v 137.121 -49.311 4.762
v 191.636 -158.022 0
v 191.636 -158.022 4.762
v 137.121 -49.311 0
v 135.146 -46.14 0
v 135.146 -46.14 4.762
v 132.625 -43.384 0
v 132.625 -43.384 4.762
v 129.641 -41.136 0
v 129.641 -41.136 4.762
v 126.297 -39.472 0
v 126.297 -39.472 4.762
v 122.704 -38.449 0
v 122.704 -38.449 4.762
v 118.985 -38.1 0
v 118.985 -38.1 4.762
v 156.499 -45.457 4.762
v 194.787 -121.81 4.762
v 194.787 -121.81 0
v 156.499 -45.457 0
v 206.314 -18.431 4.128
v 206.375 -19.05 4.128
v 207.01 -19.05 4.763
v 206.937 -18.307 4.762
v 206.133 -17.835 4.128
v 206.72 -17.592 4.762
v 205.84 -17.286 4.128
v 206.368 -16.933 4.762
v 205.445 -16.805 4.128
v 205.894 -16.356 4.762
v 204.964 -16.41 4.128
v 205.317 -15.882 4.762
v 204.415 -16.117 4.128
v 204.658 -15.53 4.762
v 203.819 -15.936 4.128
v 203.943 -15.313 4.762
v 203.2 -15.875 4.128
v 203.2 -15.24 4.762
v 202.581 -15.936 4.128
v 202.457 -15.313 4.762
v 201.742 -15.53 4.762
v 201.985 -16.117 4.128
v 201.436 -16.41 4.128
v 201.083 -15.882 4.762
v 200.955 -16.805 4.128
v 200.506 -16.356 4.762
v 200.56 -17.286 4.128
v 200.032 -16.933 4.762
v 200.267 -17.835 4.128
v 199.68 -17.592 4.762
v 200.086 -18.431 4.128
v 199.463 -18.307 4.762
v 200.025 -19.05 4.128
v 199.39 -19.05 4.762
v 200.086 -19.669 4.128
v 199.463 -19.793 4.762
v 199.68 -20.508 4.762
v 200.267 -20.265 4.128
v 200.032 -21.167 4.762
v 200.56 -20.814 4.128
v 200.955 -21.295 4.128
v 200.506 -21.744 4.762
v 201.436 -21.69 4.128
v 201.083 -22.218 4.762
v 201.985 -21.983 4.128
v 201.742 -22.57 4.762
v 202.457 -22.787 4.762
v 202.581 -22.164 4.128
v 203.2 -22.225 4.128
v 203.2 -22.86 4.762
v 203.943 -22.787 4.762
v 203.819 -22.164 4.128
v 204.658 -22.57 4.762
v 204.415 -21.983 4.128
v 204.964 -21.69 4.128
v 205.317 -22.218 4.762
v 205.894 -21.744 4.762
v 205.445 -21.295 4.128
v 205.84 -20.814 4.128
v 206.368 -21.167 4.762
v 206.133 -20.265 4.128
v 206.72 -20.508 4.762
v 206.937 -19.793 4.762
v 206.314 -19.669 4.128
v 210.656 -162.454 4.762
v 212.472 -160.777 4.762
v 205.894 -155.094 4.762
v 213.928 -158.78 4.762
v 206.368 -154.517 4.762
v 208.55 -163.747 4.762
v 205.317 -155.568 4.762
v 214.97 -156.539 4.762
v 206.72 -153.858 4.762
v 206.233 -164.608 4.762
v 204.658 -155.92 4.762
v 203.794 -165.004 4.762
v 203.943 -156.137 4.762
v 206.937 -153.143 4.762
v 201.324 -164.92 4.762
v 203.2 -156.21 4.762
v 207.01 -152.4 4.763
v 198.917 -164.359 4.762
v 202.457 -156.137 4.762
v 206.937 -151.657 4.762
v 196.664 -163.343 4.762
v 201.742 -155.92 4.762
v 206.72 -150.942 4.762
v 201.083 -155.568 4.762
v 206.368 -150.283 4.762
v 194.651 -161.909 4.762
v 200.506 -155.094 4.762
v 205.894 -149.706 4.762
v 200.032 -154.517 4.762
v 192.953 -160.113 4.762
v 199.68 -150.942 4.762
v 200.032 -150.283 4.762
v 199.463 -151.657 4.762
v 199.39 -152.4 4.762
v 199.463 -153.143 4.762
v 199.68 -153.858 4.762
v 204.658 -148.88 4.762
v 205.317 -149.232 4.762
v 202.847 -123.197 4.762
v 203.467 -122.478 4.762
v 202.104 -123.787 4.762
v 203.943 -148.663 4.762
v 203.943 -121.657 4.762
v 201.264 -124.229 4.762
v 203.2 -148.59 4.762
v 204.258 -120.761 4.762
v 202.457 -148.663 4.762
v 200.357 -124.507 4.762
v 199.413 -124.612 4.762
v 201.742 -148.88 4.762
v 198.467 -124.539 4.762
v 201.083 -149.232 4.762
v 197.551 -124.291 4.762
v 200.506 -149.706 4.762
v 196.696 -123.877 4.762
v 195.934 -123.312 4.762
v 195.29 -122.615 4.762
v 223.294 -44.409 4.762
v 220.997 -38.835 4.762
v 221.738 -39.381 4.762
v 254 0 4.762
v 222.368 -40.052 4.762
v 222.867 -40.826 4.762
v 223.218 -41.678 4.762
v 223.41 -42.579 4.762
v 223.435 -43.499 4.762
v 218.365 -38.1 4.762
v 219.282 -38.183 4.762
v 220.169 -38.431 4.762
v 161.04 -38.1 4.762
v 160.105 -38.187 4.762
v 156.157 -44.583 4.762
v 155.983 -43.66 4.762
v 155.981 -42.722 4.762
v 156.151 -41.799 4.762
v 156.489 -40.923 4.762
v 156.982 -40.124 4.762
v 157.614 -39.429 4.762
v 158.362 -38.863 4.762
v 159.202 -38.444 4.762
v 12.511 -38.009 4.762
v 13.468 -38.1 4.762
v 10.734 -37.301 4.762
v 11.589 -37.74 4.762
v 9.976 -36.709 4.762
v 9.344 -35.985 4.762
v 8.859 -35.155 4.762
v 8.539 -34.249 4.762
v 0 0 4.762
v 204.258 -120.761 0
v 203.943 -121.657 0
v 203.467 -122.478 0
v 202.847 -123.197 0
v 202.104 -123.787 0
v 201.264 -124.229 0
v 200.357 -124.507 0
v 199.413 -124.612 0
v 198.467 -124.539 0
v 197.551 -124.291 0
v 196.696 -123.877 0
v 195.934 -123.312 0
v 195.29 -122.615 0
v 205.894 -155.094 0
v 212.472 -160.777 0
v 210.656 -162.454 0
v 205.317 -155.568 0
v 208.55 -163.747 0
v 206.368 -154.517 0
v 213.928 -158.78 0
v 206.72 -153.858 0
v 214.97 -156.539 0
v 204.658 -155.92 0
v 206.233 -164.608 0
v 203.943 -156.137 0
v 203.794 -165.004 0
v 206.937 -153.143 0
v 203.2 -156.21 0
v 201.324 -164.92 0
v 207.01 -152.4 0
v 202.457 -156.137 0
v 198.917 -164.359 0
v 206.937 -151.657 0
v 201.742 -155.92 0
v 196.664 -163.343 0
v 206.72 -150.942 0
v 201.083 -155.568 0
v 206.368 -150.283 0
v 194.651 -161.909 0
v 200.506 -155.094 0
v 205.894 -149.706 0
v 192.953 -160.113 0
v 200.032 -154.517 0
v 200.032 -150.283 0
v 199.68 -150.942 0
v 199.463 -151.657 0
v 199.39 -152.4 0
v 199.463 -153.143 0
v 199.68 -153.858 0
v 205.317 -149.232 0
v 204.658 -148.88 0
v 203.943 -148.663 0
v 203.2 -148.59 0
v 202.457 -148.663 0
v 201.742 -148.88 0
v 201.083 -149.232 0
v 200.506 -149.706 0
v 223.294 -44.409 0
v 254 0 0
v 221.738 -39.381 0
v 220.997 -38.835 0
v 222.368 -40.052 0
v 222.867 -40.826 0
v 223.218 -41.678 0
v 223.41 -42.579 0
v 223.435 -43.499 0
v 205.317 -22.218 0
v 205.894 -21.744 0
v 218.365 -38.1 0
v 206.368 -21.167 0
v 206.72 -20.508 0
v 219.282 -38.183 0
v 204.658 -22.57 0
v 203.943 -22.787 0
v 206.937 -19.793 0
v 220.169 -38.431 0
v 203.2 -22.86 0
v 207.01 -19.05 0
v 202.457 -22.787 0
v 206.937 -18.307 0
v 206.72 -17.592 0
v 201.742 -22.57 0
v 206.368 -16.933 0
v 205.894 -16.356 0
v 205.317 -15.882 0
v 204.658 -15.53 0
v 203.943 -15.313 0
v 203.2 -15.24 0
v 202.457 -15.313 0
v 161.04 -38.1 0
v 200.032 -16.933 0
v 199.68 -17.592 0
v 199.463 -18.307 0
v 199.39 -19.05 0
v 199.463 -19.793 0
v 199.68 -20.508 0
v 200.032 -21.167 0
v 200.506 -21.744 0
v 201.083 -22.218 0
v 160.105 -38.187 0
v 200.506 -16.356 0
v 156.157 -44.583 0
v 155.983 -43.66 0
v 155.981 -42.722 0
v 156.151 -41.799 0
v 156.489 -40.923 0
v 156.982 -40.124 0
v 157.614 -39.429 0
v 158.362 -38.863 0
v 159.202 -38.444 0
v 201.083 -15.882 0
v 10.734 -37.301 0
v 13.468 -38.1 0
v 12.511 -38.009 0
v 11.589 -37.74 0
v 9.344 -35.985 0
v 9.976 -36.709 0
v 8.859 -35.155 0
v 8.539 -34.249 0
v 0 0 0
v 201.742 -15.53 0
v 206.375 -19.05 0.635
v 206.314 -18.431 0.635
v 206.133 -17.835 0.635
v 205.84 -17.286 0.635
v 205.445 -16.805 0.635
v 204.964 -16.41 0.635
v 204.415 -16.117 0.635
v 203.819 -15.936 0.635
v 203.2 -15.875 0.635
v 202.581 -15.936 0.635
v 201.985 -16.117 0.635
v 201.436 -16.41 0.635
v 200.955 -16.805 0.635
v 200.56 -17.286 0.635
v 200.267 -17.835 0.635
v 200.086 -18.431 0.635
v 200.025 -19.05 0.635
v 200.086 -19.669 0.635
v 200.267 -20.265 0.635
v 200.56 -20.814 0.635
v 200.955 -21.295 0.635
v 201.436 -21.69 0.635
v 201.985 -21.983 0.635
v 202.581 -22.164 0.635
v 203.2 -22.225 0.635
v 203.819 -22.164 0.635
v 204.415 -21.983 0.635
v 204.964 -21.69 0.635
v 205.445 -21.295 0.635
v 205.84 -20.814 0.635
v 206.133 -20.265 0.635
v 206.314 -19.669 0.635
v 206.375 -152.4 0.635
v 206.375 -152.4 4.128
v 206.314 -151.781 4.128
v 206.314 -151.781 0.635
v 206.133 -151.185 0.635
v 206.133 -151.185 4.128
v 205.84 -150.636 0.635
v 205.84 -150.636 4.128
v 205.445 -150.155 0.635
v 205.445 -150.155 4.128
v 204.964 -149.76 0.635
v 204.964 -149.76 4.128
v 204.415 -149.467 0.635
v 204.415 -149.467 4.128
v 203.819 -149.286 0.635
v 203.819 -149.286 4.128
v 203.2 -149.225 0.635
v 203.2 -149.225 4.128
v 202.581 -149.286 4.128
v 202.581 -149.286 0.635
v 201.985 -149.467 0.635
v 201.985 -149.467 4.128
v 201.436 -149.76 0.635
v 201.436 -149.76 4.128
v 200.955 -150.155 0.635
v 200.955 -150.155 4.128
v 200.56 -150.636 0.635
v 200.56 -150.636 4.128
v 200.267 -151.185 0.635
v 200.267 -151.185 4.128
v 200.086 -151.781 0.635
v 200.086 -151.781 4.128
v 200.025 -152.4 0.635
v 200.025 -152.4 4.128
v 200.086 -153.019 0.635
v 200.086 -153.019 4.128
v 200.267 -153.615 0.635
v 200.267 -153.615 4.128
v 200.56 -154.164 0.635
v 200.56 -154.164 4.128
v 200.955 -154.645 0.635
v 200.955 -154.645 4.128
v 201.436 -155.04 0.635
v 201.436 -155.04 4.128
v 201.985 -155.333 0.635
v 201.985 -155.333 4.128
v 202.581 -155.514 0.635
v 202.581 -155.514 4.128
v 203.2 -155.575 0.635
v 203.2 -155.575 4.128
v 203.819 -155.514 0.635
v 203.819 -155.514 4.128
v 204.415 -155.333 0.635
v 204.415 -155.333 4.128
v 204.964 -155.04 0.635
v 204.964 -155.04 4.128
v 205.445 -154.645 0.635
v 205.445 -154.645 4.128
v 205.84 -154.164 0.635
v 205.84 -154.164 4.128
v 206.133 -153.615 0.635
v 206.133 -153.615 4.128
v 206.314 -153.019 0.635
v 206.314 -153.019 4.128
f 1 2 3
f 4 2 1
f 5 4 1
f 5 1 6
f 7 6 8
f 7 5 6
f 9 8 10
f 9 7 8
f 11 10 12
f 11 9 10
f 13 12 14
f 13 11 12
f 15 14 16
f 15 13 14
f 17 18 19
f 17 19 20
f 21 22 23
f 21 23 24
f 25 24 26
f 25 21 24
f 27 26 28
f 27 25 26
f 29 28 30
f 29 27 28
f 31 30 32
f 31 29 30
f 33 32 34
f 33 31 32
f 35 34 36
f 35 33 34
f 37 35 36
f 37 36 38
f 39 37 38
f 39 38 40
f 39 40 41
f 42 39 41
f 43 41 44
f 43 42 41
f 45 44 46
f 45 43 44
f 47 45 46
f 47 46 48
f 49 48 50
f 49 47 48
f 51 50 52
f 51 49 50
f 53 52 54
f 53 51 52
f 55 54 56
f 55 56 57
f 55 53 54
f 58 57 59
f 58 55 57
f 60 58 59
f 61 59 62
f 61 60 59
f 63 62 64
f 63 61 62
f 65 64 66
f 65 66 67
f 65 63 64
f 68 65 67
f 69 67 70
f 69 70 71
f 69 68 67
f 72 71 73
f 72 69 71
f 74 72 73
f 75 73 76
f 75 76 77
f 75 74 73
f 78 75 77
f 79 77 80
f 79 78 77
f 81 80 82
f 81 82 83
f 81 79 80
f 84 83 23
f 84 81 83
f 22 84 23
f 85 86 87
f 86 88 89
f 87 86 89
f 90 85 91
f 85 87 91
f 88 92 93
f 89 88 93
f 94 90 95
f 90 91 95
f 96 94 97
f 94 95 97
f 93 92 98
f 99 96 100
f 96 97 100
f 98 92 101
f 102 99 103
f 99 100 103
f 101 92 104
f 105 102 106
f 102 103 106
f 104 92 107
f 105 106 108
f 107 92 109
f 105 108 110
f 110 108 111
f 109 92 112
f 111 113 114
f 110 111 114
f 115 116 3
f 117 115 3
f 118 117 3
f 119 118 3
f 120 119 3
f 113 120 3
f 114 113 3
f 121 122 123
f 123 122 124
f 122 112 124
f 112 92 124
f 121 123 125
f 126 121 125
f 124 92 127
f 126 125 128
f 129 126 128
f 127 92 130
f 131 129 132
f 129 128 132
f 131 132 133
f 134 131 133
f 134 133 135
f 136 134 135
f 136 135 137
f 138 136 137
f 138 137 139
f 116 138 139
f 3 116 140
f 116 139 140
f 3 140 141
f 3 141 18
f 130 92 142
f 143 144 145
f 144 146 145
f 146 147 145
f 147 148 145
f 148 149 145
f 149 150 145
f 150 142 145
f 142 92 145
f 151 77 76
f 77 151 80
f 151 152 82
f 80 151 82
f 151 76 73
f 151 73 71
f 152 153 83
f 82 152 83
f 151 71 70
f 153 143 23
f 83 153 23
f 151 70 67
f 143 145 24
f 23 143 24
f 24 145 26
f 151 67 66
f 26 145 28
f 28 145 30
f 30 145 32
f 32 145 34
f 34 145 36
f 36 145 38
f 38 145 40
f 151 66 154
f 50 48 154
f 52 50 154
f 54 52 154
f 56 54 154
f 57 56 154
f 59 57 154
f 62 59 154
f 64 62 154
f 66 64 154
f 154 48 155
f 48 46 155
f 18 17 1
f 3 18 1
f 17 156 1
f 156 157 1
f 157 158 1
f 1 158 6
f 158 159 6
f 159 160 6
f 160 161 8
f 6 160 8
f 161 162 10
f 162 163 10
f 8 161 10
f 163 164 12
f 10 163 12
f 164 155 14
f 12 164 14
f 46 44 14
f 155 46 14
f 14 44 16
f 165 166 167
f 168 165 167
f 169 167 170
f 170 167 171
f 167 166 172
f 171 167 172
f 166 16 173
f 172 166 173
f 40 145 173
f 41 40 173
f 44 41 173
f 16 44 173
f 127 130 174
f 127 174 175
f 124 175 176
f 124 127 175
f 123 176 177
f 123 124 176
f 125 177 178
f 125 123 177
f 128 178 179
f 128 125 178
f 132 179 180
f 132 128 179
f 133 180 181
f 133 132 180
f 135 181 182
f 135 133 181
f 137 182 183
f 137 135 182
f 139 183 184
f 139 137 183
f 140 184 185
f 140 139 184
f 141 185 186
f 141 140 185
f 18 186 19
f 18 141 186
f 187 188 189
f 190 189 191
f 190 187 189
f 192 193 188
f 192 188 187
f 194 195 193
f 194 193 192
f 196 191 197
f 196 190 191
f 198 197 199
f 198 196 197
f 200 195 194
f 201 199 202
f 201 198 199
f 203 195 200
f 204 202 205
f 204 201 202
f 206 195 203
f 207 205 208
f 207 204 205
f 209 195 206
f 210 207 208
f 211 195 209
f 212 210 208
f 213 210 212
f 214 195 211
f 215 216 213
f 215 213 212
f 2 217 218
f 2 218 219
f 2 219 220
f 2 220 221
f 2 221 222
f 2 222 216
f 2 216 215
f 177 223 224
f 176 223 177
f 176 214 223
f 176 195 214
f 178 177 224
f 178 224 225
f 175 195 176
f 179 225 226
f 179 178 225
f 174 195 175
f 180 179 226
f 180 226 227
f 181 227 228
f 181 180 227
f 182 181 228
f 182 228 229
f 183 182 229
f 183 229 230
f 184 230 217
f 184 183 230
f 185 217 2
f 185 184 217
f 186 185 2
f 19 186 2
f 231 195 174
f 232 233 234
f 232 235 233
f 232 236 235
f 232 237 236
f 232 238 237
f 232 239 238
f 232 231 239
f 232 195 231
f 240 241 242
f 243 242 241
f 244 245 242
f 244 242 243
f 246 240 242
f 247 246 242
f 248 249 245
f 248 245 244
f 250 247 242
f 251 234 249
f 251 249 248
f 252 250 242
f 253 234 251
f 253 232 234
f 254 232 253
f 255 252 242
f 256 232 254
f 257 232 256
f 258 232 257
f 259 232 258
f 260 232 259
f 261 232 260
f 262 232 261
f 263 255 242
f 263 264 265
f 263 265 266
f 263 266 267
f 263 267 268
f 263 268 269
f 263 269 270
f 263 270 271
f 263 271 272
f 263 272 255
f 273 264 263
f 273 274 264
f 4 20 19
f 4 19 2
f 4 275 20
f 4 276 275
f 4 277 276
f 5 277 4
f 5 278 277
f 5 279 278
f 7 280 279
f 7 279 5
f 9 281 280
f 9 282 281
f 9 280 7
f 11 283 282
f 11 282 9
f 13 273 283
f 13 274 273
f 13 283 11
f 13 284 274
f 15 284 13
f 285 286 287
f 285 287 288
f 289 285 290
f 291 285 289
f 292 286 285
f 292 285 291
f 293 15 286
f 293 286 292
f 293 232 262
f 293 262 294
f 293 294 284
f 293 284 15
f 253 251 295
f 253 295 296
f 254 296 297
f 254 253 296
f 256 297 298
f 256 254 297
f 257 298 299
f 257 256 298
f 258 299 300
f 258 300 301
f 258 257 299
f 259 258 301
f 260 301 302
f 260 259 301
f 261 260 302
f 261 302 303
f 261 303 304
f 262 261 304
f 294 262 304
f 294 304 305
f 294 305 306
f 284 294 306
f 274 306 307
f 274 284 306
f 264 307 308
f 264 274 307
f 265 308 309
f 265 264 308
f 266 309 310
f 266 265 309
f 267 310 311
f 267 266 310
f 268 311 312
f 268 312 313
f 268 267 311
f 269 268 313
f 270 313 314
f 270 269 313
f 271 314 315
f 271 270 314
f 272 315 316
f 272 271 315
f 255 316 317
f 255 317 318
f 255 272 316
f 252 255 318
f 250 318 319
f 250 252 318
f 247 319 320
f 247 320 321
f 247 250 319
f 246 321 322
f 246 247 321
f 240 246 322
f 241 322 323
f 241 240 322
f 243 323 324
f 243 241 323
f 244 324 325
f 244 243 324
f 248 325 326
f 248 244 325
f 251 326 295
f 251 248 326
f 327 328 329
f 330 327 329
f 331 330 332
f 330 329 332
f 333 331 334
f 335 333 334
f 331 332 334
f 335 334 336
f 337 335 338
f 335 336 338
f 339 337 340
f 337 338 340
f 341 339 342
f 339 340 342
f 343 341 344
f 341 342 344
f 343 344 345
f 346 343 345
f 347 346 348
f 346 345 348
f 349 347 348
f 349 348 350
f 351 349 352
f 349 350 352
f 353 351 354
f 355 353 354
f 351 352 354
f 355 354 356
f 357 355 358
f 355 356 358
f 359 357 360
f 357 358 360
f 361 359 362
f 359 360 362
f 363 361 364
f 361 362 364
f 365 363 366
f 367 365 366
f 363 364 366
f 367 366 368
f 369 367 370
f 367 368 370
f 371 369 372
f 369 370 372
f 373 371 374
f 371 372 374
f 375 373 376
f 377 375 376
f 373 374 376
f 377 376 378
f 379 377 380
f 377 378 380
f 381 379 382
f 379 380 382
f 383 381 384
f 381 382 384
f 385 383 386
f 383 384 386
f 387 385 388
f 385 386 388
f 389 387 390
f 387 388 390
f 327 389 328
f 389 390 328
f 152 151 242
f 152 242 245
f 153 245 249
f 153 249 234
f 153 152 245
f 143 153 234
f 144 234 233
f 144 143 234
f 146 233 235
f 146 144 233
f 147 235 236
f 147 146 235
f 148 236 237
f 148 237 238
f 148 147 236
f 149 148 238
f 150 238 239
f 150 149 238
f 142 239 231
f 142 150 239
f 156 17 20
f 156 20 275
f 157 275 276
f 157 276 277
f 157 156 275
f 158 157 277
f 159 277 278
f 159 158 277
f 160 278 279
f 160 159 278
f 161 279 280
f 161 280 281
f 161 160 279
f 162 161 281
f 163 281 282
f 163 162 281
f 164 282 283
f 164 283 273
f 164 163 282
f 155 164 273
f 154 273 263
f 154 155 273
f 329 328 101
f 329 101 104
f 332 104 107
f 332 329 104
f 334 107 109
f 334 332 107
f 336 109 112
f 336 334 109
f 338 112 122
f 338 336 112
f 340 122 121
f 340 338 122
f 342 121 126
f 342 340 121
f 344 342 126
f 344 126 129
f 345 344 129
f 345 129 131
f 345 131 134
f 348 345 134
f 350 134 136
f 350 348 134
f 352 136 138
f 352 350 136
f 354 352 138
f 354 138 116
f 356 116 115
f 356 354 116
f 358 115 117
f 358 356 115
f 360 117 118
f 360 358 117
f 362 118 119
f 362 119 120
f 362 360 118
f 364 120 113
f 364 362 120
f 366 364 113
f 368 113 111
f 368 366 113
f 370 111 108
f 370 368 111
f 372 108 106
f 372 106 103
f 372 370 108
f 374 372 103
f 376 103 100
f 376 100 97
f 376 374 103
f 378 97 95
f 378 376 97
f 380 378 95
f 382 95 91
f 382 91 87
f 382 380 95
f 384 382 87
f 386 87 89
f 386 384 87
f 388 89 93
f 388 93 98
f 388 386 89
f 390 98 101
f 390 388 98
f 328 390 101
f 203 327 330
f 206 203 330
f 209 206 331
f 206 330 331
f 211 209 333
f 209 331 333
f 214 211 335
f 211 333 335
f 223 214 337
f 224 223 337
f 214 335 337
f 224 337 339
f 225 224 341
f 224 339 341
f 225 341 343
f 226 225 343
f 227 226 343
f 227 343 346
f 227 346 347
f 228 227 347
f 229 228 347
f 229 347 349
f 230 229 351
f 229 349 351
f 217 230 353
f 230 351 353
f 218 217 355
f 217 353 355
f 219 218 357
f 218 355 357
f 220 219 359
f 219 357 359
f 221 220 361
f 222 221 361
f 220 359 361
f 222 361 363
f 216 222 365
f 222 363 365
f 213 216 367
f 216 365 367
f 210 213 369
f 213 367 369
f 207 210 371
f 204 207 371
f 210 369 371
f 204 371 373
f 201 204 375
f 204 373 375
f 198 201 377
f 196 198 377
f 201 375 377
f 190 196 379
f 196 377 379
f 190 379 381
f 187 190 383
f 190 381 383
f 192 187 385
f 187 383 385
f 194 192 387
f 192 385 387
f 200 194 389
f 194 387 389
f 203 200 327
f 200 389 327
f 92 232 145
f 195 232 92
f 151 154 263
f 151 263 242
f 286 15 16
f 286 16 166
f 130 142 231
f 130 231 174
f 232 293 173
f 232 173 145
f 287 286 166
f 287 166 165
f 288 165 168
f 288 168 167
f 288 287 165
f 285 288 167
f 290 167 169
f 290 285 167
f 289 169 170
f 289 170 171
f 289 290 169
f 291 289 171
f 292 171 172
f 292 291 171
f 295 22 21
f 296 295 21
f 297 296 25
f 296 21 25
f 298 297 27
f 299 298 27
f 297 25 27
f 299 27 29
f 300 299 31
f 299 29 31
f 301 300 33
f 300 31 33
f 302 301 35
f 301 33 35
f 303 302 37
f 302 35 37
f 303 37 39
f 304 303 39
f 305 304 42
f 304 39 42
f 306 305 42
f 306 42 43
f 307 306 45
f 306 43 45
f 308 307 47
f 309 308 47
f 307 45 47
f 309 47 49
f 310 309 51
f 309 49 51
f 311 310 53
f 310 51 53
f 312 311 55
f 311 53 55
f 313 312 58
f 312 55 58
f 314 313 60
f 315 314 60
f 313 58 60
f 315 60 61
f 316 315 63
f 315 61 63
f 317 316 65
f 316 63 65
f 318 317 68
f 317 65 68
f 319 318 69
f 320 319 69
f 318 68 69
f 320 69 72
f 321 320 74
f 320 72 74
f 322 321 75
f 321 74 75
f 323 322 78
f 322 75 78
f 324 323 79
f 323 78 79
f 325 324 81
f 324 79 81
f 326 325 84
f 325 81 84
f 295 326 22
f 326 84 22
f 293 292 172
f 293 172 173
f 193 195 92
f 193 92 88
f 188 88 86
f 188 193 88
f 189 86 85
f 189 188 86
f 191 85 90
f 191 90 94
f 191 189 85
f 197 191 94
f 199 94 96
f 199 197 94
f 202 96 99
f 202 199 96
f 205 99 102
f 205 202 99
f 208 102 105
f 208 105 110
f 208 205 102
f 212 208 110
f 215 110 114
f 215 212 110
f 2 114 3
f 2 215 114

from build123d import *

# Parameters (mm, degrees)
BOSS_EXTRUDE1_DEPTH = 4.7625
SKETCH3_R           = 3.175
CUT_EXTRUDE1_DEPTH  = 4.7625
CUT_EXTRUDE2_DEPTH  = 4.7625
CHAMFER2_SIZE       = 0.635
CHAMFER3_SIZE       = 0.635
CHAMFER4_SIZE       = 0.635
CHAMFER5_SIZE       = 0.635


with BuildPart() as part:
    # Sketch1 → Boss-Extrude1 (new body)
    with BuildSketch(Plane.XY):
        with BuildLine():
            Line((0, 0), (254, 0))
            Line((254, 0), (214.97033738, -156.539426679))
            ThreePointArc((214.97033738, -156.539426679), (203.793912453, -165.003761521), (191.635932139, -158.022289387))
            Line((191.635932139, -158.022289387), (137.120577335, -49.311242034))
            ThreePointArc((137.120577335, -49.311242034), (129.641206804, -41.135892713), (118.984721667, -38.1))
            Line((118.984721667, -38.1), (13.468327891, -38.1))
            ThreePointArc((13.468327891, -38.1), (10.340767596, -37.023094628), (8.539225601, -34.24896323))
            Line((8.539225601, -34.24896323), (0, 0))
        make_face()
    extrude(amount=BOSS_EXTRUDE1_DEPTH)

    # Sketch3 → Cut-Extrude1 (cut)
    with BuildSketch(Plane.XY.offset(4.7625)):
        with Locations((203.2, -152.4)):
            Circle(SKETCH3_R)
        with Locations((203.2, -19.05)):
            Circle(SKETCH3_R)
    extrude(amount=-CUT_EXTRUDE1_DEPTH, mode=Mode.SUBTRACT)

    # Sketch4 → Cut-Extrude2 (cut)
    with BuildSketch(Plane.XY.offset(4.7625)):
        with BuildLine():
            Line((161.039986458, -38.1), (218.365309961, -38.1))
            ThreePointArc((218.365309961, -38.1), (222.368404589, -40.052439705), (223.294412251, -44.40896323))
            Line((223.294412251, -44.40896323), (204.257595645, -120.761464306))
            ThreePointArc((204.257595645, -120.761464306), (199.887371396, -124.581664902), (194.787476915, -121.809685673))
            Line((194.787476915, -121.809685673), (156.498970018, -45.457184596))
            ThreePointArc((156.498970018, -45.457184596), (156.717111388, -40.511826256), (161.039986458, -38.1))
        make_face()
    extrude(amount=-CUT_EXTRUDE2_DEPTH, mode=Mode.SUBTRACT)

    # Chamfer2
    chamfer2_edges = [part.edges().sort_by_distance(p)[0] for p in [
        (200.025, -152.4, 4.7625),
    ]]
    chamfer(chamfer2_edges, length=CHAMFER2_SIZE)

    # Chamfer3
    chamfer3_edges = [part.edges().sort_by_distance(p)[0] for p in [
        (200.025, -19.05, 4.7625),
    ]]
    chamfer(chamfer3_edges, length=CHAMFER3_SIZE)

    # Chamfer4
    chamfer4_edges = [part.edges().sort_by_distance(p)[0] for p in [
        (200.025, -19.05, 0),
    ]]
    chamfer(chamfer4_edges, length=CHAMFER4_SIZE)

    # Chamfer5
    chamfer5_edges = [part.edges().sort_by_distance(p)[0] for p in [
        (200.025, -152.4, 0),
    ]]
    chamfer(chamfer5_edges, length=CHAMFER5_SIZE)


solid = part.part
